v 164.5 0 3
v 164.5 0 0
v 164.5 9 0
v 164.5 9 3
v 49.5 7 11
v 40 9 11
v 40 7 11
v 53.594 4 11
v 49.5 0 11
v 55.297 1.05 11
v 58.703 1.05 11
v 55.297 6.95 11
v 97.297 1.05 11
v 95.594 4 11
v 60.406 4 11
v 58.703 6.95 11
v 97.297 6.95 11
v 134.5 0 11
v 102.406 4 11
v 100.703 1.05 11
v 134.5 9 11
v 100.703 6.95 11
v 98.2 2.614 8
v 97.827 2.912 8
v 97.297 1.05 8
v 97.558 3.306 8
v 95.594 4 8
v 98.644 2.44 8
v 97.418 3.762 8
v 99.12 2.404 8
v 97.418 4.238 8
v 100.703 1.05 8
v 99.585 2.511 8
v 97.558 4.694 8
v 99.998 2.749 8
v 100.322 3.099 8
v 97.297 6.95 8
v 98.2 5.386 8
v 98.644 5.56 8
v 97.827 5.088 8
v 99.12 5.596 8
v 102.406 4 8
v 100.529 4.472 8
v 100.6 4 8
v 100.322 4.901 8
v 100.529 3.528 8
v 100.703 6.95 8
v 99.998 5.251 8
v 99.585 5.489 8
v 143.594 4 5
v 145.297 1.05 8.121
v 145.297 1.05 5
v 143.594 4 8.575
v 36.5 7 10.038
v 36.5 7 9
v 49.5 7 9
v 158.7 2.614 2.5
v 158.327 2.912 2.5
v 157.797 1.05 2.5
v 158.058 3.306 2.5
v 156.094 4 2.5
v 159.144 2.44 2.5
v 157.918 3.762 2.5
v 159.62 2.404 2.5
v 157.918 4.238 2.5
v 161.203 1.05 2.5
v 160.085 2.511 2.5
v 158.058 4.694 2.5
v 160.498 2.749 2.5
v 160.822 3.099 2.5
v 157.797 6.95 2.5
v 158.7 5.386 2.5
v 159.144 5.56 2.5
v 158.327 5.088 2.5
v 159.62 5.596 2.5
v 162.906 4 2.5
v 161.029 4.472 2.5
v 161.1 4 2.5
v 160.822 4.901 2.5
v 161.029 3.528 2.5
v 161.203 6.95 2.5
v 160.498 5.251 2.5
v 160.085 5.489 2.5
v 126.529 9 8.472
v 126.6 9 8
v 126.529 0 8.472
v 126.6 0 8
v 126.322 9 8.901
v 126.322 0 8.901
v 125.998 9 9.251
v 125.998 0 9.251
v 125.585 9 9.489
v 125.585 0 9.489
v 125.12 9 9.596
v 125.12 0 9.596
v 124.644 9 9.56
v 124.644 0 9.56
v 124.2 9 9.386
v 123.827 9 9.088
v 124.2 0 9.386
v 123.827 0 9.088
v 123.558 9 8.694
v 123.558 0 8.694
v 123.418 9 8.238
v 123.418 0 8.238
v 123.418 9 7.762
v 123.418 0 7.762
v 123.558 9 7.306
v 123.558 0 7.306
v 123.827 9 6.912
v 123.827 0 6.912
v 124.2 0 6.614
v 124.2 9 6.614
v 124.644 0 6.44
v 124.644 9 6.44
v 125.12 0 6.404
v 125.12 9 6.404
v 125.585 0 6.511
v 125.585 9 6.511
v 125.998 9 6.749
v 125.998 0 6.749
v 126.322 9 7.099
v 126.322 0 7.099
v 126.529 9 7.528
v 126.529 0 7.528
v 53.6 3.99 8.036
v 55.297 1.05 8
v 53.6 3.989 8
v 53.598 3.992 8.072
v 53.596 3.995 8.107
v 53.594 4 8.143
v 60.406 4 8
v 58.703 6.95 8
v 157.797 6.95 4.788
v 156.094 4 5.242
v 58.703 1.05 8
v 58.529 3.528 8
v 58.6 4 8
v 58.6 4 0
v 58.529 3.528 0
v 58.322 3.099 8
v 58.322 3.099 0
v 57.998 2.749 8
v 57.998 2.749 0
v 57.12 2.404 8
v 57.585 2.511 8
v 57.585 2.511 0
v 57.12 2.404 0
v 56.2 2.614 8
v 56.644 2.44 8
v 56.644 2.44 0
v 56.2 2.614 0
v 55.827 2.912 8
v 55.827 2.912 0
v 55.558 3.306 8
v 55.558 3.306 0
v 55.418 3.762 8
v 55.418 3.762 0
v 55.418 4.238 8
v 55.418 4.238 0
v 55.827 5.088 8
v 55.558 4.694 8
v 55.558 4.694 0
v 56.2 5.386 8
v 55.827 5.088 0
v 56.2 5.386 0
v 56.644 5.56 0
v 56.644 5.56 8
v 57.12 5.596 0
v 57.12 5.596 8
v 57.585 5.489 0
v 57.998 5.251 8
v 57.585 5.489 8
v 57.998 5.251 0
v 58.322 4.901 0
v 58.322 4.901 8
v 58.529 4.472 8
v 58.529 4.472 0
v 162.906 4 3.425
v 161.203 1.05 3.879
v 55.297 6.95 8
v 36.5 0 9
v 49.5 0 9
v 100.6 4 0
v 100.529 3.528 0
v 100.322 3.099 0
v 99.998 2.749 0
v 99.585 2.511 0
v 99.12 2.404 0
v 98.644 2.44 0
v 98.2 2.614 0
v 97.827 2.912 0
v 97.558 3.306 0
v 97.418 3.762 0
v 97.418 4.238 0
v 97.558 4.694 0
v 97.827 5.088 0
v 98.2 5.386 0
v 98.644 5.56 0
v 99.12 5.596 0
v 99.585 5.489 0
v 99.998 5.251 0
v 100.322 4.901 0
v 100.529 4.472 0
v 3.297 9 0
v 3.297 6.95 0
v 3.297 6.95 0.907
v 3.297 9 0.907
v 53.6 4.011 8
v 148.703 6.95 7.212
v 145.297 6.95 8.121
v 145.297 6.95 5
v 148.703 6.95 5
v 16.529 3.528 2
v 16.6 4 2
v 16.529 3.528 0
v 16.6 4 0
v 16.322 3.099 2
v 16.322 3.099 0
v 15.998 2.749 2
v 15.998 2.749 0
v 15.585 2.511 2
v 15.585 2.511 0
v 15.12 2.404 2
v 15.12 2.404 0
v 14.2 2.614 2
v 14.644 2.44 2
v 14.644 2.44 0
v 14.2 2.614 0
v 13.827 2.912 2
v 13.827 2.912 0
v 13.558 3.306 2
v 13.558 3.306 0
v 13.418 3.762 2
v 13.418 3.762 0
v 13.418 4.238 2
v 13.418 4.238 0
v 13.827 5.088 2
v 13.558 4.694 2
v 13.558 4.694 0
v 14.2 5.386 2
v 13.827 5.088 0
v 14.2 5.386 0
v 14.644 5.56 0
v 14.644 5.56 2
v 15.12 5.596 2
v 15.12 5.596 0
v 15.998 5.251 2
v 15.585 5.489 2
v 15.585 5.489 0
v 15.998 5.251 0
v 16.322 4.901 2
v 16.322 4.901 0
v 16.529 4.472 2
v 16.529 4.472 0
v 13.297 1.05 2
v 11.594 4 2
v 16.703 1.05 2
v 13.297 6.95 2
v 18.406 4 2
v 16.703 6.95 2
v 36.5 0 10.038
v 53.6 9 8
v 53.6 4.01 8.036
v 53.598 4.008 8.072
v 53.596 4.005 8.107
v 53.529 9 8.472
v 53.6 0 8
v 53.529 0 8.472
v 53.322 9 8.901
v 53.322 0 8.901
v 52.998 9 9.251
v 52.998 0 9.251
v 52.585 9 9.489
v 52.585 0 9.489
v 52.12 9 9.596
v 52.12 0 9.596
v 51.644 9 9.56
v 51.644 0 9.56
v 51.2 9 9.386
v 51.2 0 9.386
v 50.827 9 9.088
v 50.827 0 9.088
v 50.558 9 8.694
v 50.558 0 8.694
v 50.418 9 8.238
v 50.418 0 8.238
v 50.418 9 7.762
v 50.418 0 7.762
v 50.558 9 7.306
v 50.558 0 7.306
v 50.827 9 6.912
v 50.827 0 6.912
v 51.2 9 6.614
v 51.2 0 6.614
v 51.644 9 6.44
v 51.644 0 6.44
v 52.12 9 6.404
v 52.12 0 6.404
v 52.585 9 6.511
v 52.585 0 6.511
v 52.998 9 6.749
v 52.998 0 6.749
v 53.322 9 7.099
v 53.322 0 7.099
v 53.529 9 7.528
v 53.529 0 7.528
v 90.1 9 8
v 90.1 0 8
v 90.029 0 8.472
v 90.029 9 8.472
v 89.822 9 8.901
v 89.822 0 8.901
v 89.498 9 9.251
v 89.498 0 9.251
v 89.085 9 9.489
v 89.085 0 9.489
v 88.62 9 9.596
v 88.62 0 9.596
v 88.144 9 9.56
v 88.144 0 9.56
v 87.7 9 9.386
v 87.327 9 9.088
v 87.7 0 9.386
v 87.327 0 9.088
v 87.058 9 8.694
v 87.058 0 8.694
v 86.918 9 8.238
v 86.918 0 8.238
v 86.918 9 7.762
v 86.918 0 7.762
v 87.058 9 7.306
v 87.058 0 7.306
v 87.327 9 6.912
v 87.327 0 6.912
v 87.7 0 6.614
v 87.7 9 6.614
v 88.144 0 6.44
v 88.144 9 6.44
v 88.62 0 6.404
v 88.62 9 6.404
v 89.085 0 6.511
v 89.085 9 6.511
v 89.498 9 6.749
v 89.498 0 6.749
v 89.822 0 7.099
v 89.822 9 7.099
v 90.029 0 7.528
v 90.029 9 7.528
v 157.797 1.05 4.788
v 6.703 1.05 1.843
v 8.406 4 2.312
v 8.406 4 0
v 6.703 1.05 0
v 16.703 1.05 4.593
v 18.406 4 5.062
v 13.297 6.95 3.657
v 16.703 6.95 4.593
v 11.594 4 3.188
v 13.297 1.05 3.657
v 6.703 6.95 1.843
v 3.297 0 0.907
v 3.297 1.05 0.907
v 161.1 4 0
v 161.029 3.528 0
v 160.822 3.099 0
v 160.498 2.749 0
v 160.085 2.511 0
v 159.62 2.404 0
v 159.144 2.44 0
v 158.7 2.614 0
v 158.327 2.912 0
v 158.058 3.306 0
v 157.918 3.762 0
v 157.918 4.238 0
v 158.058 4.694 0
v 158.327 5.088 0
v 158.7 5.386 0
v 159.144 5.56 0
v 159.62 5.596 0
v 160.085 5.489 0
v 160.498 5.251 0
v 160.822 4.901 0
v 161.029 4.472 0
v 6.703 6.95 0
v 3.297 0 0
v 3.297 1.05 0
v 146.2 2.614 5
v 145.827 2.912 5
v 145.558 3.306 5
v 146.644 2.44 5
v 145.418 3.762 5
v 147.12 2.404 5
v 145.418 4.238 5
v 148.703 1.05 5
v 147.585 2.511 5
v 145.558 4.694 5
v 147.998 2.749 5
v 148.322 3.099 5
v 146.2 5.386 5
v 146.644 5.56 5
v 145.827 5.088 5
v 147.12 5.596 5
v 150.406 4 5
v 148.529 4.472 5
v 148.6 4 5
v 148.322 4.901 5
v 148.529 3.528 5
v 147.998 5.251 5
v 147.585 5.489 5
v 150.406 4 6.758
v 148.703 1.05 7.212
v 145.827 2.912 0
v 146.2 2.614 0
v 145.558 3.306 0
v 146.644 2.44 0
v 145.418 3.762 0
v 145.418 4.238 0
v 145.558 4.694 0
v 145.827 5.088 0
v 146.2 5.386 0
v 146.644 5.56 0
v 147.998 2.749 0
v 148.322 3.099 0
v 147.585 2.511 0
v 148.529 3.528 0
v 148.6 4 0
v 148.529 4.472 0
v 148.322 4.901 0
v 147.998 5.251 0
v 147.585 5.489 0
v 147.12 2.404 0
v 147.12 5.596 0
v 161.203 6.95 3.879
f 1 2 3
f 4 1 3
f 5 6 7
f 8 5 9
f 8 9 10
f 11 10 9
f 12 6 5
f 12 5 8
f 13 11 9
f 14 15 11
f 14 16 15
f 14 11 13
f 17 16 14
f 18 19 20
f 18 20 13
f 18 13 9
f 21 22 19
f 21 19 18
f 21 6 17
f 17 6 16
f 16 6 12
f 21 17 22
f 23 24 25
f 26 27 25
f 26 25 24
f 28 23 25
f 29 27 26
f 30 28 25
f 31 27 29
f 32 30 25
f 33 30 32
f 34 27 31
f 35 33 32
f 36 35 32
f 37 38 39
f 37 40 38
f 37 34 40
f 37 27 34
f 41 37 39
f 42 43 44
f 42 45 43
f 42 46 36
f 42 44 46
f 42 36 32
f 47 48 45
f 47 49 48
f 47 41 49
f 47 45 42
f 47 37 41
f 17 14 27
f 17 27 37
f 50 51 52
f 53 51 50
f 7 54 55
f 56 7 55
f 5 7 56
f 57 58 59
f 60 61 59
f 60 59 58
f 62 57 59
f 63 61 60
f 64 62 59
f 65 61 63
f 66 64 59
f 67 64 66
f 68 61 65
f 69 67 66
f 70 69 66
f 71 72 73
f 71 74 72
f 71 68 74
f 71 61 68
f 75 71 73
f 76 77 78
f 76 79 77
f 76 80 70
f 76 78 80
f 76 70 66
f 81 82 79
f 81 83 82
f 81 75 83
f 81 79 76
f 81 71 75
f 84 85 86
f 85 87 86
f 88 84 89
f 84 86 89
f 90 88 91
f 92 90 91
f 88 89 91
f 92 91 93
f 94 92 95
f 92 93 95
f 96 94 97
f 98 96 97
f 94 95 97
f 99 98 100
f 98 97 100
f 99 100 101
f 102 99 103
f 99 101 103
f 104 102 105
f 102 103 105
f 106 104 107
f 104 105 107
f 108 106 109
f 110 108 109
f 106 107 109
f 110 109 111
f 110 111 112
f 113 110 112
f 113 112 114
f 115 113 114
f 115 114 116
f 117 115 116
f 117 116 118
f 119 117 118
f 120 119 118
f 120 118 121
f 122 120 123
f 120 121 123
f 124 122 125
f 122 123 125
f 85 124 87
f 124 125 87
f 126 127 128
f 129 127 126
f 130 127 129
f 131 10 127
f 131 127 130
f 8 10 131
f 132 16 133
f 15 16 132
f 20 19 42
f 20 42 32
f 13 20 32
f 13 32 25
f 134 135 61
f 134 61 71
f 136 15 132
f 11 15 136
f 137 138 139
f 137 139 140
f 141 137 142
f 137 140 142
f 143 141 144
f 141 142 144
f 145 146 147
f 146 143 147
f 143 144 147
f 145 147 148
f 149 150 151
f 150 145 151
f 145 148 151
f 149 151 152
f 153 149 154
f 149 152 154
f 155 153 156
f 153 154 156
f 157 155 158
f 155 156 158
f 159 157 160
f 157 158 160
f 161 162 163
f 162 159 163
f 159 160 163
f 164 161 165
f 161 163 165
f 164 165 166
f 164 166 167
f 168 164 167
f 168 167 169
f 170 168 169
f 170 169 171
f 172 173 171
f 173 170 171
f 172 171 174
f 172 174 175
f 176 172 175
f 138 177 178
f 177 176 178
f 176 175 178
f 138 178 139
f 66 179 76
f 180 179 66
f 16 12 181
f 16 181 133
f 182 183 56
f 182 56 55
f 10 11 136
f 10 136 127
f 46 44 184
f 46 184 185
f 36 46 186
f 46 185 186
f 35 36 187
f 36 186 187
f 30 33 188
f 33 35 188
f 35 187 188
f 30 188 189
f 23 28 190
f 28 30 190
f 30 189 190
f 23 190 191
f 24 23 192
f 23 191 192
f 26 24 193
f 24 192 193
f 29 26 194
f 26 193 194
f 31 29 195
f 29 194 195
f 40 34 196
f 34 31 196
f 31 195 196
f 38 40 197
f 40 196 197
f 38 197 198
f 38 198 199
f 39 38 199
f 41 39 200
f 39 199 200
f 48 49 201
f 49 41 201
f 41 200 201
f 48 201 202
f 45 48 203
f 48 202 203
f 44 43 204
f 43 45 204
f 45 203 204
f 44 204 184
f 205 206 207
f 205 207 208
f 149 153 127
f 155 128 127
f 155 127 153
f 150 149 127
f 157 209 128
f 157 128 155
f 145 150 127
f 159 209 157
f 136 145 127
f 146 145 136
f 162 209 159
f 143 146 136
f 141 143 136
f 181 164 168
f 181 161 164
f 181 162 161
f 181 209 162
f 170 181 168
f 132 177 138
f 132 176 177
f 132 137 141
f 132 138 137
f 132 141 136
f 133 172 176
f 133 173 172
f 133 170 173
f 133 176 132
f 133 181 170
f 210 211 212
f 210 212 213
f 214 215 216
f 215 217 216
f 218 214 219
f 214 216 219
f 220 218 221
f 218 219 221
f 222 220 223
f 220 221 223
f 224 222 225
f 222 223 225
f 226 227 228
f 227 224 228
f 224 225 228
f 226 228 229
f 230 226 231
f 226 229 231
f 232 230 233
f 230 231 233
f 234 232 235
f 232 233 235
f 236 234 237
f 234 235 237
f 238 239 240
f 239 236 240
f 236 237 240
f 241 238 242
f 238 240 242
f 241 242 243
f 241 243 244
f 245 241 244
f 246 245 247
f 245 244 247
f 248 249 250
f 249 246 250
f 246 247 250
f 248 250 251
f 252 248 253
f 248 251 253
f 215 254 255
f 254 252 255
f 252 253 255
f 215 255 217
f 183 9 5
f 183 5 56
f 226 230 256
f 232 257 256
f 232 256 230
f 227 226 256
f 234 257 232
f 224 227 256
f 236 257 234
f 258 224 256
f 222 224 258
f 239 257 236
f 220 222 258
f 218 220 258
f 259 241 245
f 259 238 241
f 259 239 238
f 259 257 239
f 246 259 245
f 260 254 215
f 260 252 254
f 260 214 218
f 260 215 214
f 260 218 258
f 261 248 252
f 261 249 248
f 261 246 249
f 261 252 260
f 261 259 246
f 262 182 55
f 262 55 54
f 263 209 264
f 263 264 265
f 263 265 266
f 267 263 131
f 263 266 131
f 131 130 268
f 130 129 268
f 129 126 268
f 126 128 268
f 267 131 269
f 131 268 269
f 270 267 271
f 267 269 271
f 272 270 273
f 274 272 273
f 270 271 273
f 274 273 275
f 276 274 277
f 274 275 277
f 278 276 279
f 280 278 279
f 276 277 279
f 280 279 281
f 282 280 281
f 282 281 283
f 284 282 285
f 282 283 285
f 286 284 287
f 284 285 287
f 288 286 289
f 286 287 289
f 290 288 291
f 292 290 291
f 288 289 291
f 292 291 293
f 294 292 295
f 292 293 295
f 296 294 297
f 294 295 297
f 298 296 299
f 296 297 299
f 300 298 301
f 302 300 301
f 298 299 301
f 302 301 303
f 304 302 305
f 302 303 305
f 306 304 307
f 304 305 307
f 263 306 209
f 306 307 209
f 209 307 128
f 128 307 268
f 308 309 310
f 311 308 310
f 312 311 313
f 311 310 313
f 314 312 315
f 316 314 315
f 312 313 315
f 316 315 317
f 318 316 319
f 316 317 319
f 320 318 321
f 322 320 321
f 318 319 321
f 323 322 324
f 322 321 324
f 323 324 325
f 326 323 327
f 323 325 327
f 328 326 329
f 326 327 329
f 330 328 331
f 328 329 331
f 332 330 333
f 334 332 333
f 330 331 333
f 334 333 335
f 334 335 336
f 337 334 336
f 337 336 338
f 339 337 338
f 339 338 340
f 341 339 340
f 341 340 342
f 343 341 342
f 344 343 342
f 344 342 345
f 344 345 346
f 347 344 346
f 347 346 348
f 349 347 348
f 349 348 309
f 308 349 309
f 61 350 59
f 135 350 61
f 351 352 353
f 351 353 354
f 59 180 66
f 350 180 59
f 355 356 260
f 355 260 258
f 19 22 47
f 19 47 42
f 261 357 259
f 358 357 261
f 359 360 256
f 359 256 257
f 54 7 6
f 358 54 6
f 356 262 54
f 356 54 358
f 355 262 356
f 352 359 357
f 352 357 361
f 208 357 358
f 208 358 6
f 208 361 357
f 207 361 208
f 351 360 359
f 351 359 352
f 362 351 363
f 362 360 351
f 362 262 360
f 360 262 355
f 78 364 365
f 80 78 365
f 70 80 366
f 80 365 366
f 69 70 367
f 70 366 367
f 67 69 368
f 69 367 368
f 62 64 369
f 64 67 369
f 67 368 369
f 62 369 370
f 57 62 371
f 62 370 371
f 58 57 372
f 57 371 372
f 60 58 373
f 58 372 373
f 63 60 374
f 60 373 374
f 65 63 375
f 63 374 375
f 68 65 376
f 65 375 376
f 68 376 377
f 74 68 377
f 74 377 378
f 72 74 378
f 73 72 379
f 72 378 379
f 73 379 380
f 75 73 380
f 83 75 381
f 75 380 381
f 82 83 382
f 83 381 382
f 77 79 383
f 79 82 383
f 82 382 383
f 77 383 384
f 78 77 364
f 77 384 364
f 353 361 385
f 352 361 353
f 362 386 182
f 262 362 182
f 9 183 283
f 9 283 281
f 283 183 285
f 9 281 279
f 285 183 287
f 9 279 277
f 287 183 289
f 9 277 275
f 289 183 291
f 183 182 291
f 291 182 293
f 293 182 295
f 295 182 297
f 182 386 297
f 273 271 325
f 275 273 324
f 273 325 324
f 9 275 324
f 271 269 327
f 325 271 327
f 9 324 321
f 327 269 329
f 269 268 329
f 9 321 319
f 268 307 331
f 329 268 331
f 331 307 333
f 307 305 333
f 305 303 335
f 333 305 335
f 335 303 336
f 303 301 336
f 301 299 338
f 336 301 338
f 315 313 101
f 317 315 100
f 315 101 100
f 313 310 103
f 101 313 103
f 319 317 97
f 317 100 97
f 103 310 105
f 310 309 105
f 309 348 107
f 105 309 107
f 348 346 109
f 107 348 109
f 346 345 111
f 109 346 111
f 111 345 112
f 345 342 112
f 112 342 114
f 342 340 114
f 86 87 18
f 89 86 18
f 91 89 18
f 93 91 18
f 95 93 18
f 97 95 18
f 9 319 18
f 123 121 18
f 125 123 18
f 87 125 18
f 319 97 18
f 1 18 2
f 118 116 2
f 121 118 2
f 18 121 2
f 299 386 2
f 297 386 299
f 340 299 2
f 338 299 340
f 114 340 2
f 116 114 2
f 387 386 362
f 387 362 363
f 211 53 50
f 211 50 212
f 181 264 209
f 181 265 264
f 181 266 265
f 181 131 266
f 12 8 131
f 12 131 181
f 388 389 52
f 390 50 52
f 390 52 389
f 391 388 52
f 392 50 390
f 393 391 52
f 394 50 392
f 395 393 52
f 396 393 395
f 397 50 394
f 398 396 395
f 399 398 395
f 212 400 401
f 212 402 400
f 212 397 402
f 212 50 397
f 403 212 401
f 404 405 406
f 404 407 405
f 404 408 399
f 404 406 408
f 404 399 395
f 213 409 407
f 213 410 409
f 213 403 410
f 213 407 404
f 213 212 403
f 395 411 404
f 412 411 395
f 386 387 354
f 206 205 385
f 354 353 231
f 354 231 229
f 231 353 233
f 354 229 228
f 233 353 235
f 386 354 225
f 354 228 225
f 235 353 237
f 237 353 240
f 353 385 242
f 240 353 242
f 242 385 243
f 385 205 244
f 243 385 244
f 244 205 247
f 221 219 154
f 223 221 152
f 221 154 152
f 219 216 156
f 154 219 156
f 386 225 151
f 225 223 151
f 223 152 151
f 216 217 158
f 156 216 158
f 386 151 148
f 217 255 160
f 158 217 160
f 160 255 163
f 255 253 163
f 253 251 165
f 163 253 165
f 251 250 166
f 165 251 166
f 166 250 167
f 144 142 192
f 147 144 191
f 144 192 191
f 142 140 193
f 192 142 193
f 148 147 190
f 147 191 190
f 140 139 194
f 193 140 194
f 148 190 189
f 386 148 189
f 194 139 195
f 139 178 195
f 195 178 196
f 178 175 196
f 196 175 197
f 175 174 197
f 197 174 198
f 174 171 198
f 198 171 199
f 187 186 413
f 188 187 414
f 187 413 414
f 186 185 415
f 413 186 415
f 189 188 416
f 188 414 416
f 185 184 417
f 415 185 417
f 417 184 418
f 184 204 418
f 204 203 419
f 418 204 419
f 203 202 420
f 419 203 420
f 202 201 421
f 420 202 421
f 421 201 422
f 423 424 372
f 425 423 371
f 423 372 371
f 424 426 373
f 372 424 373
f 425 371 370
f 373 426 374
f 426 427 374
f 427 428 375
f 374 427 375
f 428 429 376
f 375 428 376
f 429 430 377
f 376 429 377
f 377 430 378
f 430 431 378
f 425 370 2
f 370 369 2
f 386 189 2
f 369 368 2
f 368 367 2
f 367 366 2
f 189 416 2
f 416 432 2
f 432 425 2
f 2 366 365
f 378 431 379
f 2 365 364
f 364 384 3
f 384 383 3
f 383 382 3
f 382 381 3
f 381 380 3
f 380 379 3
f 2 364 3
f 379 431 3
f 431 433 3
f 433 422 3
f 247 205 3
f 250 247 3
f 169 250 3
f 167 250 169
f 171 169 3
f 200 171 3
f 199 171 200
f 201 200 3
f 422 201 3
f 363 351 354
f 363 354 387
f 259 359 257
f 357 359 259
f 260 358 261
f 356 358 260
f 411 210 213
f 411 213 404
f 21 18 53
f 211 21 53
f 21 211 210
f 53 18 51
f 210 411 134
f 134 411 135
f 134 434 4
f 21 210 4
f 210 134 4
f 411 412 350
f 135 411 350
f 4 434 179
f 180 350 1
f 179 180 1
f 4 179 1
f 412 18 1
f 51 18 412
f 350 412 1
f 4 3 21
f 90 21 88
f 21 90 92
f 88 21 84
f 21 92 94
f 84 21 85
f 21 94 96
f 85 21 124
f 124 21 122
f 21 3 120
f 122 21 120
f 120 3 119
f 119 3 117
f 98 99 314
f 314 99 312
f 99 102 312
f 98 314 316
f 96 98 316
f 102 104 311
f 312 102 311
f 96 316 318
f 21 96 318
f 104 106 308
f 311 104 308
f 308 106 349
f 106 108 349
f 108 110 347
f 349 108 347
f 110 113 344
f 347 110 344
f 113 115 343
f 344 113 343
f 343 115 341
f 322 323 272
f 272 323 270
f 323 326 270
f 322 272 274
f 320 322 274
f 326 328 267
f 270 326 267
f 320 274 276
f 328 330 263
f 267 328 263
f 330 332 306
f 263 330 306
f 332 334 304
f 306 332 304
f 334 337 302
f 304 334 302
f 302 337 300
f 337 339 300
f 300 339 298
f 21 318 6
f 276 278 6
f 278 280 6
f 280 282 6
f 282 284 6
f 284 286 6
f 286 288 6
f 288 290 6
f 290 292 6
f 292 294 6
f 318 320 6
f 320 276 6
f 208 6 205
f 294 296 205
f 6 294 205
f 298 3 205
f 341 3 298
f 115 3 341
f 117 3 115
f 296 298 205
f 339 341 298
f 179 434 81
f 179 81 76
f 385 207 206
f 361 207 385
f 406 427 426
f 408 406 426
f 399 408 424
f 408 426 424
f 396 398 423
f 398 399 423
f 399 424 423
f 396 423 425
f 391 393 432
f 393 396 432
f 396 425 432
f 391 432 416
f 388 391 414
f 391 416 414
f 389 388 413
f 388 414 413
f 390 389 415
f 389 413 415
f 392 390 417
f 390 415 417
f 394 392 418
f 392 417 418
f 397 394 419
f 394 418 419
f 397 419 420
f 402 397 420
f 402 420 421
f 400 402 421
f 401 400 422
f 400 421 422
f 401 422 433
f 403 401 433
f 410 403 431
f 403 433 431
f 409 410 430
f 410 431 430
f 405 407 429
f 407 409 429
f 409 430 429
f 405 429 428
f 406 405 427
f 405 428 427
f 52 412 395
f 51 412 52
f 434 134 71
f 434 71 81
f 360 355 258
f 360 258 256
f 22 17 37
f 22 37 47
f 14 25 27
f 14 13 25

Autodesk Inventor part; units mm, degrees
ref_plane "YZ Plane" through (0, 0, 0) normal (1, 0, 0) x (0, 1, 0)
ref_plane "XZ Plane" through (0, 0, 0) normal (0, 1, 0) x (-1, 0, 0)
ref_plane "XY Plane" through (0, 0, 0) normal (0, 0, 1) x (1, 0, 0)
sketch "Sketch1" plane through (0, 0, 0) normal (0, 0, 1) x (1, 0, 0)
  line L0 (0, 0) -> (164.5, 0)
  line L1 (164.5, 0) -> (164.5, 9)
  line L2 (164.5, 9) -> (0, 9)
  line L3 (0, 9) -> (0, 0)
  circle A0 centre (57, 4) radius 1.6
  circle A1 centre (99, 4) radius 1.6
  circle A2 centre (159.5, 4) radius 1.6
  circle A3 centre (147, 4) radius 1.6
  circle A4 centre (15, 4) radius 1.6
  circle A5 centre (5, 4) radius 1.6
  dimension "d1" = 9
  dimension "d2" = 90
  dimension "d4" = 3.2
  dimension "d6" = 3.2
  dimension "d7" = 3.2
  dimension "d8" = 42
  dimension "d9" = 60.5
  dimension "d26" = 3.2
  dimension "d27" = 48
  dimension "d28" = 3.2
  dimension "d29" = 42
  dimension "d32" = 15
  dimension "d33" = 5
  dimension "d61" = 3.2
  dimension "d62" = 10
  dimension "d63" = 12.5
  dimension "d108" = 4
  dimension "d109" = 4
  dimension "d110" = 4
  dimension "d111" = 4
  dimension "d112" = 4
  dimension "d113" = 4
ref_plane "Work Plane2" through (0, 0, 0) normal (0, -1, 0) x (1, 0, 0)
sketch "Sketch2" plane through (0, 0, 0) normal (0, -1, 0) x (1, 0, 0)
  circle A0 centre (52, 8) radius 1.6
  circle A1 centre (125, 8) radius 1.6
  circle A2 centre (88.5, 8) radius 1.6
  point P0 (0, 0)
  point P1 (52, 0)
  dimension "d13" = 3.2
  dimension "d15" = 3.2
  dimension "d17" = 3.2
  dimension "d18" = 36.5
  dimension "d64" = 52
  dimension "d65" = 36.5
  dimension "d114" = 8
  dimension "d115" = 73
ref_plane "Work Plane1" through (0, 0, 11) normal (0, 0, 1) x (1, 0, 0)
extrude "klocek" add sketch "Sketch1" along normal blind 11
ref_plane "Work Plane3" through (0, 0, 0) normal (0, -1, 0) x (1, 0, 0)
extrude "prowadzenie osi" cut sketch "Sketch2" against normal up to next
ref_plane "Work Plane4" through (0, 0, 0) normal (0, -1, 0) x (1, 0, 0)
sketch "Sketch7" plane through (0, 0, 0) normal (0, -1, 0) x (1, 0, 0)
  line L0 (0, 11) -> (0, 0)
  line L1 (0, 11) -> (164.5, 11) projected
  line L2 (0, 11) -> (40, 11)
  line L3 (40, 11) -> (0, 0)
  point P0 (0, -1.8333)
  dimension "d86" = 11
  dimension "d87" = 40
sketch "Sketch8" plane through (0, 0, 0) normal (0, -1, 0) x (1, 0, 0)
  line L0 (164.5, 0) -> (164.5, 11) projected
  line L1 (164.5, 11) -> (164.5, 3)
  line L2 (164.5, 11) -> (0, 11) projected
  line L3 (164.5, 11) -> (134.5, 11)
  line L4 (134.5, 11) -> (164.5, 3)
  point P0 (0, 0)
  point P1 (40.8333, 11)
  dimension "d80" = 8
  dimension "d81" = 30
extrude "przedni skos" cut sketch "Sketch7" against normal up to next
extrude "tylni skos" cut sketch "Sketch8" against normal up to next
ref_plane "Work Plane7" through (0, 0, 11) normal (0, 0, 1) x (1, 0, 0)
sketch "Sketch5" plane through (0, 0, 11) normal (0, 0, 1) x (1, 0, 0)
  circle A0 centre (99, 4) radius 1.6 projected
  line L0 (95.5936, 4) -> (97.2968, 6.95)
  line L1 (97.2968, 6.95) -> (100.7032, 6.95)
  line L2 (100.7032, 6.95) -> (102.4064, 4)
  line L3 (102.4064, 4) -> (100.7032, 1.05)
  line L4 (100.7032, 1.05) -> (97.2968, 1.05)
  line L5 (97.2968, 1.05) -> (95.5936, 4)
  circle A1 centre (57, 4) radius 1.6 projected
  line L6 (60.4064, 4) -> (58.7032, 1.05)
  line L7 (58.7032, 1.05) -> (55.2968, 1.05)
  line L8 (55.2968, 1.05) -> (53.5936, 4)
  line L9 (53.5936, 4) -> (55.2968, 6.95)
  line L10 (55.2968, 6.95) -> (58.7032, 6.95)
  line L11 (58.7032, 6.95) -> (60.4064, 4)
  point P0 (119.5, 5)
  dimension "d98" = 5.9
  dimension "d100" = 5.9
extrude "hex insert middle" cut sketch "Sketch5" against normal blind 3
ref_plane "Work Plane6" through (0, 0, 11) normal (0, 0, 1) x (1, 0, 0)
sketch "Sketch9" plane through (0, 0, 11) normal (0, 0, 1) x (1, 0, 0)
  circle A0 centre (147, 4) radius 1.6 projected
  line L0 (150.4064, 4) -> (148.7032, 1.05)
  line L1 (148.7032, 1.05) -> (145.2968, 1.05)
  line L2 (145.2968, 1.05) -> (143.5936, 4)
  line L3 (143.5936, 4) -> (145.2968, 6.95)
  line L4 (145.2968, 6.95) -> (148.7032, 6.95)
  line L5 (148.7032, 6.95) -> (150.4064, 4)
  point P0 (0, 0)
  point P1 (153, 5)
  dimension "d99" = 5.9
extrude "hex insert rear 1" cut sketch "Sketch9" against normal blind 6
ref_plane "Work Plane5" through (0, 0, 11) normal (0, 0, 1) x (1, 0, 0)
sketch "Sketch10" plane through (0, 0, 11) normal (0, 0, 1) x (1, 0, 0)
  circle A0 centre (159.5, 4) radius 1.6 projected
  line L0 (162.9064, 4) -> (161.2032, 1.05)
  line L1 (161.2032, 1.05) -> (157.7968, 1.05)
  line L2 (157.7968, 1.05) -> (156.0936, 4)
  line L3 (156.0936, 4) -> (157.7968, 6.95)
  line L4 (157.7968, 6.95) -> (161.2032, 6.95)
  line L5 (161.2032, 6.95) -> (162.9064, 4)
  point P0 (0, 0)
  dimension "d101" = 5.9
extrude "hex insert rear 2" cut sketch "Sketch10" against normal blind 8.5
sketch "Sketch13" plane through (0, 0, 11) normal (0, 0, 1) x (1, 0, 0)
  circle A0 centre (5, 4) radius 1.6 projected
  line L0 (8.4064, 4) -> (6.7032, 1.05)
  line L1 (6.7032, 1.05) -> (3.2968, 1.05)
  line L2 (3.2968, 1.05) -> (1.5936, 4)
  line L3 (1.5936, 4) -> (3.2968, 6.95)
  line L4 (3.2968, 6.95) -> (6.7032, 6.95)
  line L5 (6.7032, 6.95) -> (8.4064, 4)
  point P0 (0, 0)
  dimension "d90" = 5.9
extrude "hex insert front 1" cut sketch "Sketch13" against normal through all
sketch "Sketch16" plane through (0, 0, 11) normal (0, 0, 1) x (1, 0, 0)
  circle A0 centre (15, 4) radius 1.6 projected
  line L0 (18.4064, 4) -> (16.7032, 1.05)
  line L1 (16.7032, 1.05) -> (13.2968, 1.05)
  line L2 (13.2968, 1.05) -> (11.5936, 4)
  line L3 (11.5936, 4) -> (13.2968, 6.95)
  line L4 (13.2968, 6.95) -> (16.7032, 6.95)
  line L5 (16.7032, 6.95) -> (18.4064, 4)
  point P0 (0, 0)
  dimension "d93" = 5.9
extrude "hex insert front 2" cut sketch "Sketch16" against normal blind 9
sketch "Sketch17" plane through (0, 0, 0) normal (0, 0, -1) x (-1, 0, 0)
  line L0 (0, 9) -> (0, 0) projected
  line L1 (0, 0) -> (-3.2968, 0)
  line L2 (-3.2968, 0) -> (-3.2968, 10.0042)
  line L3 (-3.2968, 10.0042) -> (0, 10.0042)
  line L4 (0, 10.0042) -> (0, 0)
extrude "Extrusion20" cut sketch "Sketch17" against normal up to next
sketch "Sketch18" plane through (40, 0, 11) normal (0, -1, 0) x (1, 0, 0)
  line L0 (9.5, 0) -> (9.5, -2)
  line L1 (9.5, -2) -> (-3.5, -2)
  line L2 (-3.5, -2) -> (-3.5, 0)
  line L3 (-3.5, 0) -> (9.5, 0)
  line L4 (94.5, 0) -> (0, 0) projected
  circle A0 centre (12, -3) radius 1.6 projected
  line L5 (-36.7032, -11) -> (124.5, -11) projected
  point P0 (-40, -11)
  dimension "d102" = 2
  dimension "d103" = 13
  dimension "d104" = 2.5
extrude "Extrusion21" cut sketch "Sketch18" against normal blind 7 contours L0 L1 L2 L3
properties part number "wheel_support_v2_narrow_with_line_sensor"
